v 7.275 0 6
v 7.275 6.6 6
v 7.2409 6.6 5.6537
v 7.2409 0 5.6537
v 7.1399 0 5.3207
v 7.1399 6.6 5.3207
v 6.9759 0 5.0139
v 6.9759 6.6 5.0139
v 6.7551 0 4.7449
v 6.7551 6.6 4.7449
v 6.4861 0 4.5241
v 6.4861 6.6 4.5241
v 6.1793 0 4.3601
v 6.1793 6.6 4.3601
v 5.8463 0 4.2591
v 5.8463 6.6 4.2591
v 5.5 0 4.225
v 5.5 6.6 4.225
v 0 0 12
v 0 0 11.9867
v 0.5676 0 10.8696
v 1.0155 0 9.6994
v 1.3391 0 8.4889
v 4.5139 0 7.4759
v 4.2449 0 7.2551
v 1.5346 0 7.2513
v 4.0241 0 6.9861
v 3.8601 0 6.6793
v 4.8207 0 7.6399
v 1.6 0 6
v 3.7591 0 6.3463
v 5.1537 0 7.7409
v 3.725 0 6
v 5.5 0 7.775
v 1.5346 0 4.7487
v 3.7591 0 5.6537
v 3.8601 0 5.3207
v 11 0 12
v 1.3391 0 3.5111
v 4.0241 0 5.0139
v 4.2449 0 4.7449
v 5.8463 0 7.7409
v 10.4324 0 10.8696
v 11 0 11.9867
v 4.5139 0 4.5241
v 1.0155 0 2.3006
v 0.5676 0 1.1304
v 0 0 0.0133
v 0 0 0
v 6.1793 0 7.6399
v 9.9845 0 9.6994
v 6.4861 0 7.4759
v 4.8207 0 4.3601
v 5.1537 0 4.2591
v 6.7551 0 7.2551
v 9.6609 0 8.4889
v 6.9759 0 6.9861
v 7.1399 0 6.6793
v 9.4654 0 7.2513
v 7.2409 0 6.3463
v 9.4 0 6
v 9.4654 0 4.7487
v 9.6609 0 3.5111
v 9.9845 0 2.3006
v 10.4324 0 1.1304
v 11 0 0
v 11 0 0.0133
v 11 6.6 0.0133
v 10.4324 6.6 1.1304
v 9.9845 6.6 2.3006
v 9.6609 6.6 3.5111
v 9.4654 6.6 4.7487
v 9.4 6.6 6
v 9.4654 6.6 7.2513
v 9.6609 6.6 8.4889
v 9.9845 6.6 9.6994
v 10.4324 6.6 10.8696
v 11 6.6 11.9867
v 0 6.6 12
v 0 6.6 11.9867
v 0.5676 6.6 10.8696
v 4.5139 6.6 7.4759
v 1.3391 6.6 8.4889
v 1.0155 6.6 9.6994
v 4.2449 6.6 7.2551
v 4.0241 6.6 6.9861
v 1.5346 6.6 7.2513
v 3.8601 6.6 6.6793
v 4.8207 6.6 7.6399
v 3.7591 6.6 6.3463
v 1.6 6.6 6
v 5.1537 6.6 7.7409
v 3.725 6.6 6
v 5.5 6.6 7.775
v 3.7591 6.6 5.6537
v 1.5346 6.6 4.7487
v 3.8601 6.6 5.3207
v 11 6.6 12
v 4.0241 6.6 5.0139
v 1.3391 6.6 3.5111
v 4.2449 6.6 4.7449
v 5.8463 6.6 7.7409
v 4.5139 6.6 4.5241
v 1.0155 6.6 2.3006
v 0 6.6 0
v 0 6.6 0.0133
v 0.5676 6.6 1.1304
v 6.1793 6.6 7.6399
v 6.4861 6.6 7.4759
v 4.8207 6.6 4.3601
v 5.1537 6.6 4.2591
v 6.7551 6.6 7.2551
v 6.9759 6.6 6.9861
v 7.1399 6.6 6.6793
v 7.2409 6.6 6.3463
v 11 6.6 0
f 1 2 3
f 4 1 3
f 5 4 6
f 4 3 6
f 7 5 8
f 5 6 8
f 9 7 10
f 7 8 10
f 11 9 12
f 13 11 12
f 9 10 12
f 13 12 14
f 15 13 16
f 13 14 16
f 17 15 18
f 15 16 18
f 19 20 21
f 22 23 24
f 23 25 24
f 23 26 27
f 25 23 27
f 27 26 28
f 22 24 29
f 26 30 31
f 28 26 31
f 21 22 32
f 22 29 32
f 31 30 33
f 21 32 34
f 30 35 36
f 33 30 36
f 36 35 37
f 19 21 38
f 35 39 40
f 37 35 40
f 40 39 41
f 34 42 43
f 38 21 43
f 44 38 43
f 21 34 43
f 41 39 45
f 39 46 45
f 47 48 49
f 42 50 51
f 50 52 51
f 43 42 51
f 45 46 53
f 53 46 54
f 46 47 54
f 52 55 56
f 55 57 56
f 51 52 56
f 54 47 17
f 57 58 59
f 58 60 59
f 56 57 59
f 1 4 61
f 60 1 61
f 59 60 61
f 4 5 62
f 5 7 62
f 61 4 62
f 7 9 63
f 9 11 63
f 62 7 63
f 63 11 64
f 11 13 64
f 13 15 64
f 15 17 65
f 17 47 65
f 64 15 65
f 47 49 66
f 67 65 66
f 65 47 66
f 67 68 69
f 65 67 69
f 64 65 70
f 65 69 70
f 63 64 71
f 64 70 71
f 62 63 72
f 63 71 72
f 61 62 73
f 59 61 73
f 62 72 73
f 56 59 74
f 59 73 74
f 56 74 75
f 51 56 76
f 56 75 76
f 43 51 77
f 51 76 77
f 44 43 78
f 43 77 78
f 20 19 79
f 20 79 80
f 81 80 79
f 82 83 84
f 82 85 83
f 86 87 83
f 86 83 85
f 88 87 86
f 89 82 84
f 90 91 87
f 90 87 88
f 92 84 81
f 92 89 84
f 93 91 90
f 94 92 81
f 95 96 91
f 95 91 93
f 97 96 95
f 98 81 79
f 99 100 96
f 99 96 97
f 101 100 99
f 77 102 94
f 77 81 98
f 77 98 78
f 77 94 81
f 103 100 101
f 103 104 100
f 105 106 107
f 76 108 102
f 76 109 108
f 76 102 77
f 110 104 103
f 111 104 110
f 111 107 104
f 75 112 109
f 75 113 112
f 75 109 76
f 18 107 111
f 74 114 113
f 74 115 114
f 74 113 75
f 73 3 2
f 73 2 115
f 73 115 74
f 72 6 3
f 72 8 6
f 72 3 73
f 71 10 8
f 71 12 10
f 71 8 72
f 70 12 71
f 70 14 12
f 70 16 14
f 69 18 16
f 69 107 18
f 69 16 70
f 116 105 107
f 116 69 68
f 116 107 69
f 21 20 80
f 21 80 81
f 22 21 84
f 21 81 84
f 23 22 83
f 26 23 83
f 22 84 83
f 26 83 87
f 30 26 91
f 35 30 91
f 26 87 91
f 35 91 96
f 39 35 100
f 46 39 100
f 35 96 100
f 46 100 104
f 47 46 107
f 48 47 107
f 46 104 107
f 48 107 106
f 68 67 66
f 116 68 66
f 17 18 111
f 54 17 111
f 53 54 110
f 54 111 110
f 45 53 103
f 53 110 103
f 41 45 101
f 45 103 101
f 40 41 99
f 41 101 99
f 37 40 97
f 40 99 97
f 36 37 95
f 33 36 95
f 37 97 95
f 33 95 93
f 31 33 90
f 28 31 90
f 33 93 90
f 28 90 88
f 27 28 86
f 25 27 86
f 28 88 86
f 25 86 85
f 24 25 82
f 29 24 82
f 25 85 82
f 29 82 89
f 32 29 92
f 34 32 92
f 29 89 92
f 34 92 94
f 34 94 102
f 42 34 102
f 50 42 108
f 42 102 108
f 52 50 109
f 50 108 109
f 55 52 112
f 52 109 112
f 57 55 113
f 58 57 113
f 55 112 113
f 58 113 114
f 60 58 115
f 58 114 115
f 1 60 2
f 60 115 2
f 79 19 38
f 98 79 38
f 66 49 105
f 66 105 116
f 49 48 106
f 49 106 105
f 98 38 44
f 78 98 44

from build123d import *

# Parameters (mm, degrees)
SKETCH1_W           = 11
SKETCH1_H           = 12
BOSS_EXTRUDE1_DEPTH = 6.6
CUT_EXTRUDE1_DEPTH  = 6.6


with BuildPart() as part:
    # Sketch1 → Boss-Extrude1 (new body)
    with BuildSketch(Plane(origin=(0, 0, 0), x_dir=(1, 0, 0), z_dir=(0, 1, 0))):
        with Locations((5.5, -6)):
            Rectangle(SKETCH1_W, SKETCH1_H)
    extrude(amount=BOSS_EXTRUDE1_DEPTH)

    # Sketch2 → Cut-Extrude1 (cut)
    with BuildSketch(Plane(origin=(0, 6.6, 0), x_dir=(1, 0, 0), z_dir=(0, 1, 0))):
        with BuildLine():
            ThreePointArc((11, -0.013348181), (9.4, -6), (11, -11.986651819))
            Line((11, -11.986651819), (11, -0.013348181))
        make_face()
        with BuildLine():
            ThreePointArc((0, -11.986651819), (1.6, -6), (0, -0.013348181))
            Line((0, -0.013348181), (0, -11.986651819))
        make_face()
        with BuildLine():
            ThreePointArc((7.275, -6), (6.755114537, -4.744885463), (5.5, -4.225))
            Line((5.5, -4.225), (5.5, -7.775))
            ThreePointArc((5.5, -7.775), (6.755114537, -7.255114537), (7.275, -6))
        make_face()
        with BuildLine():
            Line((5.5, -7.775), (5.5, -4.225))
            ThreePointArc((5.5, -4.225), (3.725, -6), (5.5, -7.775))
        make_face()
    extrude(amount=-CUT_EXTRUDE1_DEPTH, mode=Mode.SUBTRACT)


solid = part.part
